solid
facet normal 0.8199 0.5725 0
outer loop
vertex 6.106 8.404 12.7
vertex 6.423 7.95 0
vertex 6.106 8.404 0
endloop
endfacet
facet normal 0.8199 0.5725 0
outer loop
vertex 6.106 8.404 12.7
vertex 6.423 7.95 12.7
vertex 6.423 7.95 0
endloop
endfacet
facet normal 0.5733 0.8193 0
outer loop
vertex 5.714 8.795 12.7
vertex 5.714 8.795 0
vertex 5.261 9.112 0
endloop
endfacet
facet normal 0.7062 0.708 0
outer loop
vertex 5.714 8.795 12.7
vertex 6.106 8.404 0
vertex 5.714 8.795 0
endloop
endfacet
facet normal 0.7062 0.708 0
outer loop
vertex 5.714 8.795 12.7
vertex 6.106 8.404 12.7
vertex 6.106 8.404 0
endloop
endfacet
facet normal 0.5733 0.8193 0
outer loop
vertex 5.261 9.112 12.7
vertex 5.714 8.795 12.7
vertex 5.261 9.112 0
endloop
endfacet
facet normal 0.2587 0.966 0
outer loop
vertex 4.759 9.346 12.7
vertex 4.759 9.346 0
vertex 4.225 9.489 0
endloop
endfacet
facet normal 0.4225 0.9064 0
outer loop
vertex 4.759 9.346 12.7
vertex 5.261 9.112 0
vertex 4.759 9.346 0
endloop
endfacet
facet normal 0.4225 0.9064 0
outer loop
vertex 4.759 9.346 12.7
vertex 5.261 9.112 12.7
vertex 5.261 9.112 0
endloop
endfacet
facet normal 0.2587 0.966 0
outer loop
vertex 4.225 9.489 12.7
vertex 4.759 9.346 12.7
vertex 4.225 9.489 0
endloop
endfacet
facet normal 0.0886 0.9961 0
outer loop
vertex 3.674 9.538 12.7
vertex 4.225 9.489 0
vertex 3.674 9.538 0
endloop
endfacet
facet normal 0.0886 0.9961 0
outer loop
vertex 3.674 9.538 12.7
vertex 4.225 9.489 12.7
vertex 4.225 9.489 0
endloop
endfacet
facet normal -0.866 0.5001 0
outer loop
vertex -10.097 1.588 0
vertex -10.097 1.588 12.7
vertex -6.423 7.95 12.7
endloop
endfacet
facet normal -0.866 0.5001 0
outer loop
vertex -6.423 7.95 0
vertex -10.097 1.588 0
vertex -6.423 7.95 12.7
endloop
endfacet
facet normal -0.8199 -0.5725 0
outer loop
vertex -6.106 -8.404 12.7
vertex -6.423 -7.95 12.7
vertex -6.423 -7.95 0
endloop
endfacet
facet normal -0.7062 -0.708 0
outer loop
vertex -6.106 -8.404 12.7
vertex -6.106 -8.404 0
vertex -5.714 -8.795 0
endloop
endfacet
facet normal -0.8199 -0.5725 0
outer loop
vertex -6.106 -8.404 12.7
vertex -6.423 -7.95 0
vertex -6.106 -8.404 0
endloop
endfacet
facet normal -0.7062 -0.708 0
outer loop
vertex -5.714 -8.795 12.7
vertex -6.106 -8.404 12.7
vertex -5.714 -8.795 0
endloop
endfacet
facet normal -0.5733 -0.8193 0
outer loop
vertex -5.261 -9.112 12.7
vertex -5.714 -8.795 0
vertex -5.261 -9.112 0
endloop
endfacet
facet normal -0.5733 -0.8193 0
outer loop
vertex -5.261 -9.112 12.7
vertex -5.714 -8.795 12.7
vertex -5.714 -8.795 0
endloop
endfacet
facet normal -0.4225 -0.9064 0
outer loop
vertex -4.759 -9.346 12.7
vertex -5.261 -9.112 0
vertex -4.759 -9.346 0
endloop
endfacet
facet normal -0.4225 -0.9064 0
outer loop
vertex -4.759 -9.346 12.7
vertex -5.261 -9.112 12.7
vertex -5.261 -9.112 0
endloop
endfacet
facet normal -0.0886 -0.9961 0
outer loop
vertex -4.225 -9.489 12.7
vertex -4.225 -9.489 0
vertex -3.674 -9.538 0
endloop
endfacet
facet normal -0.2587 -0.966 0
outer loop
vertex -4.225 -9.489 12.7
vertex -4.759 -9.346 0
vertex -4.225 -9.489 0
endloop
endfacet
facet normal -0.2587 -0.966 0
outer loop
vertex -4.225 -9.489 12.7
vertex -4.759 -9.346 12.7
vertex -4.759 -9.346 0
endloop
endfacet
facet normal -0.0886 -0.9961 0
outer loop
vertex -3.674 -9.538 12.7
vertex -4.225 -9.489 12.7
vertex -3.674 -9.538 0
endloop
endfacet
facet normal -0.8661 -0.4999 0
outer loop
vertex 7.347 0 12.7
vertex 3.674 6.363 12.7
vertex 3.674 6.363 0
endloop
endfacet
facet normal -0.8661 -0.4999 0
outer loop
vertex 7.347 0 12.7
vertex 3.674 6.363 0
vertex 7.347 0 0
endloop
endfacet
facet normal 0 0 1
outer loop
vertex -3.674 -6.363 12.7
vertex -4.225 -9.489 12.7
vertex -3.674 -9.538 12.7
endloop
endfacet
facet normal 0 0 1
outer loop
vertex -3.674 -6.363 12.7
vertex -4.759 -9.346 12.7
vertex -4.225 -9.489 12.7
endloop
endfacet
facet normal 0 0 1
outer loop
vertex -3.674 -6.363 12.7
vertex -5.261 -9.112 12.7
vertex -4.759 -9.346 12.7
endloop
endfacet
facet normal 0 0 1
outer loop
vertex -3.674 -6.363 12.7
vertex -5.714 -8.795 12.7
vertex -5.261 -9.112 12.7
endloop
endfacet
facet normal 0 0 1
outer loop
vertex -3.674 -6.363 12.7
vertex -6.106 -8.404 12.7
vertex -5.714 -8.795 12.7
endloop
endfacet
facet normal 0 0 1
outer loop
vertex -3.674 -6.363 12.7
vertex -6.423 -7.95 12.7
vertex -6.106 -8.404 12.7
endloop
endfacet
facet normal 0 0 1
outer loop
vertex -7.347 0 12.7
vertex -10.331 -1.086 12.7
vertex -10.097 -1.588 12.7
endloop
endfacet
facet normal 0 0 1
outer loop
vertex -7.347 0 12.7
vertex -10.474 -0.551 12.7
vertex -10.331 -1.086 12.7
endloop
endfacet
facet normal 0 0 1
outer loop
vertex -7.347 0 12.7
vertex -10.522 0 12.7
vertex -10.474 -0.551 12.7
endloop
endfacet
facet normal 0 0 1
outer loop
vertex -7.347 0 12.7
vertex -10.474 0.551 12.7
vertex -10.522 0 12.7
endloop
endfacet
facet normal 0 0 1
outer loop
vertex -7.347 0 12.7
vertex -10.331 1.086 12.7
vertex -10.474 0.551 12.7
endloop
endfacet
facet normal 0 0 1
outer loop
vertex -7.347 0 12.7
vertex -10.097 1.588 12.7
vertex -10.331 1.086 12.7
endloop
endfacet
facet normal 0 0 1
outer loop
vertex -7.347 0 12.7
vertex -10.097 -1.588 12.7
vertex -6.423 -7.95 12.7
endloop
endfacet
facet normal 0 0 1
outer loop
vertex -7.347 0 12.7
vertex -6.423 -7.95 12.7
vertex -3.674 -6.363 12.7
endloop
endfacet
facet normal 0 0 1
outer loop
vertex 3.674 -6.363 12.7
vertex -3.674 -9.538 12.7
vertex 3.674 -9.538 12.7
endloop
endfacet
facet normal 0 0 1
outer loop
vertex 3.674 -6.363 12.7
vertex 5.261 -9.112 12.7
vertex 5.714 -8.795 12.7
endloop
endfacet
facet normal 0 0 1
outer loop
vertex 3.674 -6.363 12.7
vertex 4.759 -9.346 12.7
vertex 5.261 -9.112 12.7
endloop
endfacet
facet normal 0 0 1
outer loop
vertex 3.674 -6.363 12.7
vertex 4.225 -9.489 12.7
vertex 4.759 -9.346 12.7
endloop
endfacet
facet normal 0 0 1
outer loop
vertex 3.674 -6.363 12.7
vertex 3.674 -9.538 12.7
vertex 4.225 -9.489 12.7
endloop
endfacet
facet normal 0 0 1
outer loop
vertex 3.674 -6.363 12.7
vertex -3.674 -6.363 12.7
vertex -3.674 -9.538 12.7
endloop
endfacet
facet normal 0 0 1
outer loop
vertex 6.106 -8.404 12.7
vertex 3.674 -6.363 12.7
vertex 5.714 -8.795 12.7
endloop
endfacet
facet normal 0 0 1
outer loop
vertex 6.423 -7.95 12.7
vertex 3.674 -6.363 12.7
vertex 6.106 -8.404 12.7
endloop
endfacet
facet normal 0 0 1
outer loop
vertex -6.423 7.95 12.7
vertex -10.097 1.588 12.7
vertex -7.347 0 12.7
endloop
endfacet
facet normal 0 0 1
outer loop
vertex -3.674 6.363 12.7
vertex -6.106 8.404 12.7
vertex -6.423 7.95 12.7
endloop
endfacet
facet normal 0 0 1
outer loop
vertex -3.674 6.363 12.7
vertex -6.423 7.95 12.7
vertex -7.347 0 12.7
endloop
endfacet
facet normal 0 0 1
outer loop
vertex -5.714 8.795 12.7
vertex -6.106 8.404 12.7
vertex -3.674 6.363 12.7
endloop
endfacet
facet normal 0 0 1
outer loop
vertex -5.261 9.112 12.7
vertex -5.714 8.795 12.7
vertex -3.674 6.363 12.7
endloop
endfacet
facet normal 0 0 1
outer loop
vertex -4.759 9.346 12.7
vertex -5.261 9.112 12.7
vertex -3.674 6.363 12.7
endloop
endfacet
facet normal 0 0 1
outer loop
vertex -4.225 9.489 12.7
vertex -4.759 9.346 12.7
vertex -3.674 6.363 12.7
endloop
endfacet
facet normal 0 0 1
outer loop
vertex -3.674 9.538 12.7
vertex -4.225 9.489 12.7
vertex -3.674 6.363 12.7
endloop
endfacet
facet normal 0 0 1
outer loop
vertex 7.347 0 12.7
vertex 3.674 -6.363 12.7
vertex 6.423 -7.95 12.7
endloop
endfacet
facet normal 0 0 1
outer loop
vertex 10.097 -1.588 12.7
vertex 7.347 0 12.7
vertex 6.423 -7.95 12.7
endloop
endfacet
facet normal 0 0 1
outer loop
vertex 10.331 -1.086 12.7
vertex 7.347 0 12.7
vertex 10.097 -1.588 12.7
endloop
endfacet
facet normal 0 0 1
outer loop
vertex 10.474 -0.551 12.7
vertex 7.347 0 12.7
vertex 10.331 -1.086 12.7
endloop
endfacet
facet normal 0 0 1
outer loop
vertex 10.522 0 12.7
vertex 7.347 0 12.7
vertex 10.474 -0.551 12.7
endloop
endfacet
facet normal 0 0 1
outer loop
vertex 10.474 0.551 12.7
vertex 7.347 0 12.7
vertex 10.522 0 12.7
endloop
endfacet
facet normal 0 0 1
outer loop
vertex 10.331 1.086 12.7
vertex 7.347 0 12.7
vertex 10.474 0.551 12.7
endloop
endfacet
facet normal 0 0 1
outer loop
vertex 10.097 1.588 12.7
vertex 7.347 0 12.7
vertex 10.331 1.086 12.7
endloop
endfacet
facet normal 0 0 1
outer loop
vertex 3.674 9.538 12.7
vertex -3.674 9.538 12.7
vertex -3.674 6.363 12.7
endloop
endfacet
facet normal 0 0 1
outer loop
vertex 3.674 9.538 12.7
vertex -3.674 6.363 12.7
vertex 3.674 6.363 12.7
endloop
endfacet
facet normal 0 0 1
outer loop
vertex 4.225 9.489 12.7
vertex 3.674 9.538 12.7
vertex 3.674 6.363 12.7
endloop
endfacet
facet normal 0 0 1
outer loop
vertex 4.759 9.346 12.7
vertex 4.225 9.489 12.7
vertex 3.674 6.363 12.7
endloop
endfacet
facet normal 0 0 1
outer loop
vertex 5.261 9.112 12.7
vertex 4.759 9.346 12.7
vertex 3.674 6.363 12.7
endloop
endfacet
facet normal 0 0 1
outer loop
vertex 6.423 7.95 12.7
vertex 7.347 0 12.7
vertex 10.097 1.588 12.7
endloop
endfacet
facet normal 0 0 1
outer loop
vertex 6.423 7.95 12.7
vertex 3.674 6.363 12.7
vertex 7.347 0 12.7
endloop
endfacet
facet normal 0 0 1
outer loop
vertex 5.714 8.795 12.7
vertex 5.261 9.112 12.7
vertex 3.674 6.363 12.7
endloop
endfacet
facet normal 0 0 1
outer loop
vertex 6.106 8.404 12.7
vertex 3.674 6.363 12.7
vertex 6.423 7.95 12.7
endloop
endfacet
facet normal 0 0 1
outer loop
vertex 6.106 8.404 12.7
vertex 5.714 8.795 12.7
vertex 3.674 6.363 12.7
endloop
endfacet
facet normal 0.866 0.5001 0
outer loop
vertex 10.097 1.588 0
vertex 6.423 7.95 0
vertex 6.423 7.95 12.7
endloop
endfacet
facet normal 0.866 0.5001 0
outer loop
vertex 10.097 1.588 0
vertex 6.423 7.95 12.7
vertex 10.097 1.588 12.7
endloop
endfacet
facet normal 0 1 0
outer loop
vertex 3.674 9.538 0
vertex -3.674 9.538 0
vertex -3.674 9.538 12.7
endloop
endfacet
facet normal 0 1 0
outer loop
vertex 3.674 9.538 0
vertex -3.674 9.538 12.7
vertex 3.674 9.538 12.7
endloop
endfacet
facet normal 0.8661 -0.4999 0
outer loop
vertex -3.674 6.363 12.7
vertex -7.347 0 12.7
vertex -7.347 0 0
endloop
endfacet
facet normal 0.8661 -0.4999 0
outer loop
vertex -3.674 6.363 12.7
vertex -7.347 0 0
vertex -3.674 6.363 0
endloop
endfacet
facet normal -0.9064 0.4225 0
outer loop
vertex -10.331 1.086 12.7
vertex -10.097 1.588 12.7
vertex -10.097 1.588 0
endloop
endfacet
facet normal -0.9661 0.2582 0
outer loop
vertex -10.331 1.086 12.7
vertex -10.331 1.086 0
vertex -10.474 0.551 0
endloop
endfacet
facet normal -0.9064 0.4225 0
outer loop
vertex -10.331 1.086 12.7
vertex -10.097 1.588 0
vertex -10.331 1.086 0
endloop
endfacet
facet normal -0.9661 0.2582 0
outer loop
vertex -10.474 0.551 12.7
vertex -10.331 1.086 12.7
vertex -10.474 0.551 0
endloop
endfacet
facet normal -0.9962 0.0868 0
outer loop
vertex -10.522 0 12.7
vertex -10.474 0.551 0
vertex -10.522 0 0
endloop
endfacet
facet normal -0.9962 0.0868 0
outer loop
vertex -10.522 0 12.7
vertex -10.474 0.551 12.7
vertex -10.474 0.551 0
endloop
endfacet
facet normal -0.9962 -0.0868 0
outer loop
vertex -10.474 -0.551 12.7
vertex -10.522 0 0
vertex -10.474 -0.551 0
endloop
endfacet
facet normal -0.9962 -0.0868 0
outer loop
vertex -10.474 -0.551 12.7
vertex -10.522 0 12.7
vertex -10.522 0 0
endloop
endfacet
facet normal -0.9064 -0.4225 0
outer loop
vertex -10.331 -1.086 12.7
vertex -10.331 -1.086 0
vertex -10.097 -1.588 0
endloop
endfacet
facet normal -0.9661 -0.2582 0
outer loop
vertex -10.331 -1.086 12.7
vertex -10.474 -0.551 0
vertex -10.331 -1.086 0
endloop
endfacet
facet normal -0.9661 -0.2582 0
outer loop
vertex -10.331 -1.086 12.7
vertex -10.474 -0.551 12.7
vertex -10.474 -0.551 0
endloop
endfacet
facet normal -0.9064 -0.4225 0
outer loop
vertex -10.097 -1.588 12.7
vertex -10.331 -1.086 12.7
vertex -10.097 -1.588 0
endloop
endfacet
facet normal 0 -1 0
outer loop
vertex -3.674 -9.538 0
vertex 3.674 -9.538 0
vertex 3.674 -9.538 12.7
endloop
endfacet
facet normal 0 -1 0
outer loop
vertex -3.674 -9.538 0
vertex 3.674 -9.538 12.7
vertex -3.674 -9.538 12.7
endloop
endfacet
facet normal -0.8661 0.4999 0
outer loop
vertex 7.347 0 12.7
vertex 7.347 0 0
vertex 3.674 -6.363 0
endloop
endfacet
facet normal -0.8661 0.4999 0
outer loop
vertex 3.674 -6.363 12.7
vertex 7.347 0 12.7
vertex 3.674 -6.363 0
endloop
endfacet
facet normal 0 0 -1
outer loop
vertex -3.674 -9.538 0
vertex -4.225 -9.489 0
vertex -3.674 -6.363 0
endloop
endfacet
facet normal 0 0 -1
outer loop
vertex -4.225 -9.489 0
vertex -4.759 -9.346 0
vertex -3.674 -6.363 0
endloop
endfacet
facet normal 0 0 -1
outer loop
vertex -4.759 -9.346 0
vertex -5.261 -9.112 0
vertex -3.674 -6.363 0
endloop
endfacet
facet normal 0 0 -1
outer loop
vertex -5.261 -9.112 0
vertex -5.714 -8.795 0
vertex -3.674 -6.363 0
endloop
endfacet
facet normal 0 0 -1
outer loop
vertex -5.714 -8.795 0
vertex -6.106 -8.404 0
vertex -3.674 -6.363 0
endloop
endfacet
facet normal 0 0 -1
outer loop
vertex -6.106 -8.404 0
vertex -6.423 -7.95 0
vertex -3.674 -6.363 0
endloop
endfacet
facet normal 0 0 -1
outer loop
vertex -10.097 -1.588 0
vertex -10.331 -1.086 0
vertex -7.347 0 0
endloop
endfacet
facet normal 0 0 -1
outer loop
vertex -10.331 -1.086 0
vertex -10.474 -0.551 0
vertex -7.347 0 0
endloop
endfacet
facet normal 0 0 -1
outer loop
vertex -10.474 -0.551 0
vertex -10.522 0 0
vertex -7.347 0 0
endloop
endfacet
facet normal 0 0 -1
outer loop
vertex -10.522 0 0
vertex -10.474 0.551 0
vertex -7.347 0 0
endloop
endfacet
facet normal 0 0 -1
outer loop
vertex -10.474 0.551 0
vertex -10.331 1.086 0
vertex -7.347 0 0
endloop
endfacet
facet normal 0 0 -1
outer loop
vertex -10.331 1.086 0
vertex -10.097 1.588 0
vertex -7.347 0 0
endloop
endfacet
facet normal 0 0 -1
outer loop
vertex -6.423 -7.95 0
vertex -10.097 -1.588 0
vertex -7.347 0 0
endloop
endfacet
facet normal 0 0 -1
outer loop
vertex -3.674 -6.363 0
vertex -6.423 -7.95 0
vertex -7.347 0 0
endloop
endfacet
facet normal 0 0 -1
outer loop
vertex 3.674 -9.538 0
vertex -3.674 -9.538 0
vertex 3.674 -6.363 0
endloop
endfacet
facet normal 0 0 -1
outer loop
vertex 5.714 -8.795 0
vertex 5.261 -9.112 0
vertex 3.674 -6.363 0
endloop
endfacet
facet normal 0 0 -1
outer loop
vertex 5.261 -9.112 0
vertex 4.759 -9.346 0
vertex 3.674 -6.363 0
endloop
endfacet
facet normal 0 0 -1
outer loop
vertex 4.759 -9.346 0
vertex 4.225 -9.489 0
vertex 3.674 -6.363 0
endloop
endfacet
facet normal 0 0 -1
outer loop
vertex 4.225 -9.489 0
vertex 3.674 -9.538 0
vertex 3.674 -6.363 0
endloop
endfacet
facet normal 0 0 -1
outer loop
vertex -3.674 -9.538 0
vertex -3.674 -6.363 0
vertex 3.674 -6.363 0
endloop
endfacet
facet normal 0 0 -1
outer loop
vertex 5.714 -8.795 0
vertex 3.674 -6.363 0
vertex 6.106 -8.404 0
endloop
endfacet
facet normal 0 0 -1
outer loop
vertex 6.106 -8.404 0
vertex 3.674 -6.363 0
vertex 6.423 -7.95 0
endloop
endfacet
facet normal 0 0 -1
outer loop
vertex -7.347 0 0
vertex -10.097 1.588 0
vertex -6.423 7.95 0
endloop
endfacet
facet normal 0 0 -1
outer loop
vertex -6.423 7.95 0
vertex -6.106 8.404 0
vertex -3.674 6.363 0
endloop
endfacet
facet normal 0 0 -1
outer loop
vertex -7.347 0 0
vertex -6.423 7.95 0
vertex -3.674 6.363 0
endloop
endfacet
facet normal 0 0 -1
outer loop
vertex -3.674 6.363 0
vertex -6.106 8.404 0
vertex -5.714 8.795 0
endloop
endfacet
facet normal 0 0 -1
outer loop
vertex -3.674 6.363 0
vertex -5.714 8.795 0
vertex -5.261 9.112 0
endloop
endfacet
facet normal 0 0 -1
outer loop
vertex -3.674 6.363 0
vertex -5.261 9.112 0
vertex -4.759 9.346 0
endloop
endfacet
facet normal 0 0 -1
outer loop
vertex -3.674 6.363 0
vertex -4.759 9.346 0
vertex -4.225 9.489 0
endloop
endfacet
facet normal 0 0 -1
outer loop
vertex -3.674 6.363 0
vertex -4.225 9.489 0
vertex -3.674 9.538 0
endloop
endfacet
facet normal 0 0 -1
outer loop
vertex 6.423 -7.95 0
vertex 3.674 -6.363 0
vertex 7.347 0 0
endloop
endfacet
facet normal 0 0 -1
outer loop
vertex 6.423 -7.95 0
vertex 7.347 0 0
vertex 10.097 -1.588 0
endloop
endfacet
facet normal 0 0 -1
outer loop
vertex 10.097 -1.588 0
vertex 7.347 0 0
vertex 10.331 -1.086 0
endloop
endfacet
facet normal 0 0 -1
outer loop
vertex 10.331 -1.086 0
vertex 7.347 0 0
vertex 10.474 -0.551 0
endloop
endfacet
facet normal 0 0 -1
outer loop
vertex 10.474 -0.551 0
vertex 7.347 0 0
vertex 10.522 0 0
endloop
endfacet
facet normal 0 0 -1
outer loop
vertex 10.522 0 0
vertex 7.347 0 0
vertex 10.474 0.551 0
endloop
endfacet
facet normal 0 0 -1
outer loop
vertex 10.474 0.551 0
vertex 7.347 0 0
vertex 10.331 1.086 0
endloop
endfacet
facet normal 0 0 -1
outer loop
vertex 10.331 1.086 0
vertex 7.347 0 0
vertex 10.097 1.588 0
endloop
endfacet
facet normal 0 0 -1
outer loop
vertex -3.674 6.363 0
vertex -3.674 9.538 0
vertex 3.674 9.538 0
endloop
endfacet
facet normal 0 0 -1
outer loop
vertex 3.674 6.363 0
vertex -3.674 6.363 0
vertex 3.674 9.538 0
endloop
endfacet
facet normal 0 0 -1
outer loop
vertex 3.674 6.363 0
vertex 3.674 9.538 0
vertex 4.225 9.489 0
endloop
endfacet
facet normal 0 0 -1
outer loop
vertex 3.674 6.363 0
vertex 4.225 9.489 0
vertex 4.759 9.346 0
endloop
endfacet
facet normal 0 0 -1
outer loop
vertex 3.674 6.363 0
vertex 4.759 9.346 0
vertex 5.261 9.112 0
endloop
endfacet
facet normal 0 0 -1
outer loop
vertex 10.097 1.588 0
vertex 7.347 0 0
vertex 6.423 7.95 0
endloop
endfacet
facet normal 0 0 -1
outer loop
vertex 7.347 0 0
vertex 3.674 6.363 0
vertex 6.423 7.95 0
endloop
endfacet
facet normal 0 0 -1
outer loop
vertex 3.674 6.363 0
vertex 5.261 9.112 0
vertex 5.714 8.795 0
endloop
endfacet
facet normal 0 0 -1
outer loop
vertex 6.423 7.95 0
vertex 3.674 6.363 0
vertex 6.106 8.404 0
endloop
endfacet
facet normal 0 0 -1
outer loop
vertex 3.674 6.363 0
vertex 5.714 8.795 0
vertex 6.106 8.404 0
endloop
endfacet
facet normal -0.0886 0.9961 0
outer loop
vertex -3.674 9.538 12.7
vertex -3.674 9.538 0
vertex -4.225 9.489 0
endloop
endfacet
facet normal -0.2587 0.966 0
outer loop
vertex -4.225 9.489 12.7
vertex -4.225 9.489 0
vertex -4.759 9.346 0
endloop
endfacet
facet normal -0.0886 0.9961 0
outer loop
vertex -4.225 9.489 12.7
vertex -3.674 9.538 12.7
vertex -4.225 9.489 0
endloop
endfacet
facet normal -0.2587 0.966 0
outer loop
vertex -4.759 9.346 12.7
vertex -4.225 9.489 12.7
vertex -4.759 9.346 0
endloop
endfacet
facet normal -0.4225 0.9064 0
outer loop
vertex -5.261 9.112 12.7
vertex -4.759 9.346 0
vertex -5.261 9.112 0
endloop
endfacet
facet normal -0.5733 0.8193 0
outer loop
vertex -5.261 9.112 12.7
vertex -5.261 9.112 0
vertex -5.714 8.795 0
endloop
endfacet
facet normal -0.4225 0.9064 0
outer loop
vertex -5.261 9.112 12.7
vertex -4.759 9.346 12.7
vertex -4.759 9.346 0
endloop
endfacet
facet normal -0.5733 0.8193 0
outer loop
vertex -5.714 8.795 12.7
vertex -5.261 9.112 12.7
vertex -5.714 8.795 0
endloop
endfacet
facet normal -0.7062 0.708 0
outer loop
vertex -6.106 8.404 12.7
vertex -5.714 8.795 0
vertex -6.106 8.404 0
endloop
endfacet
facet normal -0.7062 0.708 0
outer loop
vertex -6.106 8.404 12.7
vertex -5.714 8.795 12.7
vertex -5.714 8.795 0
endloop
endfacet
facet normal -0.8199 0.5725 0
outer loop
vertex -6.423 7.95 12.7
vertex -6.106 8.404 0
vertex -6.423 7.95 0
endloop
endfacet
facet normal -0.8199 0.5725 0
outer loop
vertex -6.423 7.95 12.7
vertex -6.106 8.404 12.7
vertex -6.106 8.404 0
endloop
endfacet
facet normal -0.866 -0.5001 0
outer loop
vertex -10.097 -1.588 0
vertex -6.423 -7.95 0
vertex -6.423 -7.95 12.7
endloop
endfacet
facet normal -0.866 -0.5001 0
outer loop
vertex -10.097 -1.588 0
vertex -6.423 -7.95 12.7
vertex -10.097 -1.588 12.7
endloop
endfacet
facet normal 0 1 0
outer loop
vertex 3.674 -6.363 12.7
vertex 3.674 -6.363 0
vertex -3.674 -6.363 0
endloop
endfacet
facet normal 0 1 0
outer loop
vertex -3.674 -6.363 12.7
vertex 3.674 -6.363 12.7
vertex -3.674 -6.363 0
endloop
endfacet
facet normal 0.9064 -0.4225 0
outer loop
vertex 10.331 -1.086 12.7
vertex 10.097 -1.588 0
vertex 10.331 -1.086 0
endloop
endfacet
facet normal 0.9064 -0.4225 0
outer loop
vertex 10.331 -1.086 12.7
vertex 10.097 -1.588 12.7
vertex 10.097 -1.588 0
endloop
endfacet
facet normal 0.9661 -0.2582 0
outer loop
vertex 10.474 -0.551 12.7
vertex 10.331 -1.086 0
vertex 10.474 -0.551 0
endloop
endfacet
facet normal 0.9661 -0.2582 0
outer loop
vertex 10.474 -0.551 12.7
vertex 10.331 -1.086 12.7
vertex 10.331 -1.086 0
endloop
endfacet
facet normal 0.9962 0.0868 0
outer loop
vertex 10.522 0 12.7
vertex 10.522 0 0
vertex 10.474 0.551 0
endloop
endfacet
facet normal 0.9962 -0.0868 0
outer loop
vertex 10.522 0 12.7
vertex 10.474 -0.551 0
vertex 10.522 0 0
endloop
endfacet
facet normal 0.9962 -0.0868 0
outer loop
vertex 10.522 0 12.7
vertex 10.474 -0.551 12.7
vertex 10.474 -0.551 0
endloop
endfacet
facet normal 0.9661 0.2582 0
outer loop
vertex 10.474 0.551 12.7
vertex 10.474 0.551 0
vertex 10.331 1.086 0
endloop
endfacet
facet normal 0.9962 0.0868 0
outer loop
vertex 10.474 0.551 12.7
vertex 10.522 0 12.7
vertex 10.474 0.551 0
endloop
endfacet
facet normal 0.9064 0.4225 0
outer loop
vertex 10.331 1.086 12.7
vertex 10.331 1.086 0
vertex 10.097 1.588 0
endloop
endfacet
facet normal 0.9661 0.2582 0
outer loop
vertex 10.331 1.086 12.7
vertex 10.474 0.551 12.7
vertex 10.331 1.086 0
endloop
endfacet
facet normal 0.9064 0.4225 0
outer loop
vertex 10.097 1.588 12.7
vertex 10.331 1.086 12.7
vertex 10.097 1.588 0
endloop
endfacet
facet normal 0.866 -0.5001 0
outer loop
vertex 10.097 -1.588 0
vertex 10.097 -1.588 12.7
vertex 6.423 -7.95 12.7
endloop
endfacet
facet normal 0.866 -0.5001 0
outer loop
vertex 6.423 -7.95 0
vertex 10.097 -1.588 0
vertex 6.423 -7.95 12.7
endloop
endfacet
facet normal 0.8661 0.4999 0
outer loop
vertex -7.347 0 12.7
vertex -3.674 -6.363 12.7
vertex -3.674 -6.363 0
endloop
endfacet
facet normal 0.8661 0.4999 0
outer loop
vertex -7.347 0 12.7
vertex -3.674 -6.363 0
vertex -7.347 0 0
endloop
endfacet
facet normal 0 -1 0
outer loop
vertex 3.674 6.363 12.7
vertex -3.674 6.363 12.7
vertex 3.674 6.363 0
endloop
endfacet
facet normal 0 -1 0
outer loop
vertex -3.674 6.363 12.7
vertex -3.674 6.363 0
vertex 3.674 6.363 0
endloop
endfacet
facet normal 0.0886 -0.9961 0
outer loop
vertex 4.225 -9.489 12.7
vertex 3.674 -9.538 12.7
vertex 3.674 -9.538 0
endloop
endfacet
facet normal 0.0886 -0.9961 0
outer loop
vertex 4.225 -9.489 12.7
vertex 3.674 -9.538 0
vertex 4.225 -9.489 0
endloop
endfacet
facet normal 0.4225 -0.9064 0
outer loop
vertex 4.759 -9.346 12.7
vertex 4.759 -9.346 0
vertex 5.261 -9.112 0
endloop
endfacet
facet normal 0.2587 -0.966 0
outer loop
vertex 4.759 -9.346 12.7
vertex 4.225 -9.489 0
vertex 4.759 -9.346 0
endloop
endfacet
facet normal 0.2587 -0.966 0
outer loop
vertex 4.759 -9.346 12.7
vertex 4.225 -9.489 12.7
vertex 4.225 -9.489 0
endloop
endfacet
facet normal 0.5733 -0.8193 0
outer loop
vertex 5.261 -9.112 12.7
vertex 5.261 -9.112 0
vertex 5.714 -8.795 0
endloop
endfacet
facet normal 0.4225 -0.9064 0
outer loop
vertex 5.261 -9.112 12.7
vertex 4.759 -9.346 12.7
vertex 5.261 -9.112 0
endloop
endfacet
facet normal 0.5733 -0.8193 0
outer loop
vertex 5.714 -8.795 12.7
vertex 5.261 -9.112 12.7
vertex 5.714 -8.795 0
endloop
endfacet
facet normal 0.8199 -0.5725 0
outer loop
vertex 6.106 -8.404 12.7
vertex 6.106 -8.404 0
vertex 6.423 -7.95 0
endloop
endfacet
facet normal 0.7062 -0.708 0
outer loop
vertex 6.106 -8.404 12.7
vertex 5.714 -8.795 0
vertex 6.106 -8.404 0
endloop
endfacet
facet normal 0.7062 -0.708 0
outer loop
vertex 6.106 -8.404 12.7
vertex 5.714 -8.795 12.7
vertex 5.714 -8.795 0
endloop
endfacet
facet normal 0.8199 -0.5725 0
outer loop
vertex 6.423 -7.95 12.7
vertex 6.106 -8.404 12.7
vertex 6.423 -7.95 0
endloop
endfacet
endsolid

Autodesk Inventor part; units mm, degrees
ref_plane "YZ Plane" through (0, 0, 0) normal (1, 0, 0) x (0, 1, 0)
ref_plane "XZ Plane" through (0, 0, 0) normal (0, 1, 0) x (-1, 0, 0)
ref_plane "XY Plane" through (0, 0, 0) normal (0, 0, 1) x (1, 0, 0)
sketch "Sketch1" plane through (0, 0, 0) normal (0, 0, 1) x (1, 0, 0)
  line L0 (-3.6735, 6.3627) -> (3.6735, 6.3627)
  line L1 (3.6735, 6.3627) -> (7.347, 0)
  line L2 (7.347, 0) -> (3.6735, -6.3627)
  line L3 (3.6735, -6.3627) -> (-3.6735, -6.3627)
  line L4 (-3.6735, -6.3627) -> (-7.347, 0)
  line L5 (-7.347, 0) -> (-3.6735, 6.3627)
  line L6 (-15.4185, 0) -> (15.4185, 0) construction
  line L7 (-5.5066, 9.5377) -> (5.5066, 9.5377)
  line L8 (5.5066, 9.5377) -> (11.0132, 0)
  line L9 (11.0132, 0) -> (5.5066, -9.5377)
  line L10 (5.5066, -9.5377) -> (-5.5066, -9.5377)
  line L11 (-5.5066, -9.5377) -> (-11.0132, 0)
  line L12 (-11.0132, 0) -> (-5.5066, 9.5377)
  point P0 (0, 0)
  point P1 (0, 0)
  point P2 (0, 0)
  dimension "d0" = 12.7254
  dimension "d1" = 3.175
extrude "Extrusion1" add sketch "Sketch1" along normal blind 12.7
fillet "Fillet1" radius 3.175 6 edges at (5.5066, -9.5377, 6.35) (-5.5066, -9.5377, 6.35) (11.0132, 0, 6.35) (-11.0132, 0, 6.35) (-5.5066, 9.5377, 6.35) (5.5066, 9.5377, 6.35)
properties part number "1-2in_spacer"
